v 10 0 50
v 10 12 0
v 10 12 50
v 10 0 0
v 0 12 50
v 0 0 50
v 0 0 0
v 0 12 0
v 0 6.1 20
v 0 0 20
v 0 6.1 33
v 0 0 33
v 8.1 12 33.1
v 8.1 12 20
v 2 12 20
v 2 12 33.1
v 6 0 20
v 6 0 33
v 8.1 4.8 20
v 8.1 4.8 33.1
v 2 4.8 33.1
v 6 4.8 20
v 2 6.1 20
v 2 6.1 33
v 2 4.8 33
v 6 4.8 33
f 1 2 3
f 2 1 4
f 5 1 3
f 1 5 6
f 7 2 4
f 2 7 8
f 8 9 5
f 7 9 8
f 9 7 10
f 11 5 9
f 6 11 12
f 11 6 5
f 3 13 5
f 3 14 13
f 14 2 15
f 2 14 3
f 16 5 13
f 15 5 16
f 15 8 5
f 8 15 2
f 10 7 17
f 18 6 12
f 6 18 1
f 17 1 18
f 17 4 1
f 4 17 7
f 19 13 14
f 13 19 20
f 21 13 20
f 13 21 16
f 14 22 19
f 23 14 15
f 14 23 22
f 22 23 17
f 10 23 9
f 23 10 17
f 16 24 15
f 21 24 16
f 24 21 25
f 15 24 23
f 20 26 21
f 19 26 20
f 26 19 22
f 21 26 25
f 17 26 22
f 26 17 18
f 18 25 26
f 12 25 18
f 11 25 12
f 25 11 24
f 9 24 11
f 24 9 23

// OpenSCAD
verfuegendeTiefe = 23 - 10;
schalterSpiel = 2;
schalterLaenge = 13;
schalterBreite = 6;
schalterHoehe = 7;

difference() {
    cube([10, verfuegendeTiefe-1, 50]);
    translate([2, verfuegendeTiefe - schalterHoehe-1.2, 20]) cube([schalterBreite+0.1, schalterHoehe+1, schalterLaenge+0.1]);
    translate([4, -1, 20]) cube([2, 20, schalterLaenge]);
    translate([-1, -1, 20]) cube([6, 7.1, schalterLaenge]);
}
